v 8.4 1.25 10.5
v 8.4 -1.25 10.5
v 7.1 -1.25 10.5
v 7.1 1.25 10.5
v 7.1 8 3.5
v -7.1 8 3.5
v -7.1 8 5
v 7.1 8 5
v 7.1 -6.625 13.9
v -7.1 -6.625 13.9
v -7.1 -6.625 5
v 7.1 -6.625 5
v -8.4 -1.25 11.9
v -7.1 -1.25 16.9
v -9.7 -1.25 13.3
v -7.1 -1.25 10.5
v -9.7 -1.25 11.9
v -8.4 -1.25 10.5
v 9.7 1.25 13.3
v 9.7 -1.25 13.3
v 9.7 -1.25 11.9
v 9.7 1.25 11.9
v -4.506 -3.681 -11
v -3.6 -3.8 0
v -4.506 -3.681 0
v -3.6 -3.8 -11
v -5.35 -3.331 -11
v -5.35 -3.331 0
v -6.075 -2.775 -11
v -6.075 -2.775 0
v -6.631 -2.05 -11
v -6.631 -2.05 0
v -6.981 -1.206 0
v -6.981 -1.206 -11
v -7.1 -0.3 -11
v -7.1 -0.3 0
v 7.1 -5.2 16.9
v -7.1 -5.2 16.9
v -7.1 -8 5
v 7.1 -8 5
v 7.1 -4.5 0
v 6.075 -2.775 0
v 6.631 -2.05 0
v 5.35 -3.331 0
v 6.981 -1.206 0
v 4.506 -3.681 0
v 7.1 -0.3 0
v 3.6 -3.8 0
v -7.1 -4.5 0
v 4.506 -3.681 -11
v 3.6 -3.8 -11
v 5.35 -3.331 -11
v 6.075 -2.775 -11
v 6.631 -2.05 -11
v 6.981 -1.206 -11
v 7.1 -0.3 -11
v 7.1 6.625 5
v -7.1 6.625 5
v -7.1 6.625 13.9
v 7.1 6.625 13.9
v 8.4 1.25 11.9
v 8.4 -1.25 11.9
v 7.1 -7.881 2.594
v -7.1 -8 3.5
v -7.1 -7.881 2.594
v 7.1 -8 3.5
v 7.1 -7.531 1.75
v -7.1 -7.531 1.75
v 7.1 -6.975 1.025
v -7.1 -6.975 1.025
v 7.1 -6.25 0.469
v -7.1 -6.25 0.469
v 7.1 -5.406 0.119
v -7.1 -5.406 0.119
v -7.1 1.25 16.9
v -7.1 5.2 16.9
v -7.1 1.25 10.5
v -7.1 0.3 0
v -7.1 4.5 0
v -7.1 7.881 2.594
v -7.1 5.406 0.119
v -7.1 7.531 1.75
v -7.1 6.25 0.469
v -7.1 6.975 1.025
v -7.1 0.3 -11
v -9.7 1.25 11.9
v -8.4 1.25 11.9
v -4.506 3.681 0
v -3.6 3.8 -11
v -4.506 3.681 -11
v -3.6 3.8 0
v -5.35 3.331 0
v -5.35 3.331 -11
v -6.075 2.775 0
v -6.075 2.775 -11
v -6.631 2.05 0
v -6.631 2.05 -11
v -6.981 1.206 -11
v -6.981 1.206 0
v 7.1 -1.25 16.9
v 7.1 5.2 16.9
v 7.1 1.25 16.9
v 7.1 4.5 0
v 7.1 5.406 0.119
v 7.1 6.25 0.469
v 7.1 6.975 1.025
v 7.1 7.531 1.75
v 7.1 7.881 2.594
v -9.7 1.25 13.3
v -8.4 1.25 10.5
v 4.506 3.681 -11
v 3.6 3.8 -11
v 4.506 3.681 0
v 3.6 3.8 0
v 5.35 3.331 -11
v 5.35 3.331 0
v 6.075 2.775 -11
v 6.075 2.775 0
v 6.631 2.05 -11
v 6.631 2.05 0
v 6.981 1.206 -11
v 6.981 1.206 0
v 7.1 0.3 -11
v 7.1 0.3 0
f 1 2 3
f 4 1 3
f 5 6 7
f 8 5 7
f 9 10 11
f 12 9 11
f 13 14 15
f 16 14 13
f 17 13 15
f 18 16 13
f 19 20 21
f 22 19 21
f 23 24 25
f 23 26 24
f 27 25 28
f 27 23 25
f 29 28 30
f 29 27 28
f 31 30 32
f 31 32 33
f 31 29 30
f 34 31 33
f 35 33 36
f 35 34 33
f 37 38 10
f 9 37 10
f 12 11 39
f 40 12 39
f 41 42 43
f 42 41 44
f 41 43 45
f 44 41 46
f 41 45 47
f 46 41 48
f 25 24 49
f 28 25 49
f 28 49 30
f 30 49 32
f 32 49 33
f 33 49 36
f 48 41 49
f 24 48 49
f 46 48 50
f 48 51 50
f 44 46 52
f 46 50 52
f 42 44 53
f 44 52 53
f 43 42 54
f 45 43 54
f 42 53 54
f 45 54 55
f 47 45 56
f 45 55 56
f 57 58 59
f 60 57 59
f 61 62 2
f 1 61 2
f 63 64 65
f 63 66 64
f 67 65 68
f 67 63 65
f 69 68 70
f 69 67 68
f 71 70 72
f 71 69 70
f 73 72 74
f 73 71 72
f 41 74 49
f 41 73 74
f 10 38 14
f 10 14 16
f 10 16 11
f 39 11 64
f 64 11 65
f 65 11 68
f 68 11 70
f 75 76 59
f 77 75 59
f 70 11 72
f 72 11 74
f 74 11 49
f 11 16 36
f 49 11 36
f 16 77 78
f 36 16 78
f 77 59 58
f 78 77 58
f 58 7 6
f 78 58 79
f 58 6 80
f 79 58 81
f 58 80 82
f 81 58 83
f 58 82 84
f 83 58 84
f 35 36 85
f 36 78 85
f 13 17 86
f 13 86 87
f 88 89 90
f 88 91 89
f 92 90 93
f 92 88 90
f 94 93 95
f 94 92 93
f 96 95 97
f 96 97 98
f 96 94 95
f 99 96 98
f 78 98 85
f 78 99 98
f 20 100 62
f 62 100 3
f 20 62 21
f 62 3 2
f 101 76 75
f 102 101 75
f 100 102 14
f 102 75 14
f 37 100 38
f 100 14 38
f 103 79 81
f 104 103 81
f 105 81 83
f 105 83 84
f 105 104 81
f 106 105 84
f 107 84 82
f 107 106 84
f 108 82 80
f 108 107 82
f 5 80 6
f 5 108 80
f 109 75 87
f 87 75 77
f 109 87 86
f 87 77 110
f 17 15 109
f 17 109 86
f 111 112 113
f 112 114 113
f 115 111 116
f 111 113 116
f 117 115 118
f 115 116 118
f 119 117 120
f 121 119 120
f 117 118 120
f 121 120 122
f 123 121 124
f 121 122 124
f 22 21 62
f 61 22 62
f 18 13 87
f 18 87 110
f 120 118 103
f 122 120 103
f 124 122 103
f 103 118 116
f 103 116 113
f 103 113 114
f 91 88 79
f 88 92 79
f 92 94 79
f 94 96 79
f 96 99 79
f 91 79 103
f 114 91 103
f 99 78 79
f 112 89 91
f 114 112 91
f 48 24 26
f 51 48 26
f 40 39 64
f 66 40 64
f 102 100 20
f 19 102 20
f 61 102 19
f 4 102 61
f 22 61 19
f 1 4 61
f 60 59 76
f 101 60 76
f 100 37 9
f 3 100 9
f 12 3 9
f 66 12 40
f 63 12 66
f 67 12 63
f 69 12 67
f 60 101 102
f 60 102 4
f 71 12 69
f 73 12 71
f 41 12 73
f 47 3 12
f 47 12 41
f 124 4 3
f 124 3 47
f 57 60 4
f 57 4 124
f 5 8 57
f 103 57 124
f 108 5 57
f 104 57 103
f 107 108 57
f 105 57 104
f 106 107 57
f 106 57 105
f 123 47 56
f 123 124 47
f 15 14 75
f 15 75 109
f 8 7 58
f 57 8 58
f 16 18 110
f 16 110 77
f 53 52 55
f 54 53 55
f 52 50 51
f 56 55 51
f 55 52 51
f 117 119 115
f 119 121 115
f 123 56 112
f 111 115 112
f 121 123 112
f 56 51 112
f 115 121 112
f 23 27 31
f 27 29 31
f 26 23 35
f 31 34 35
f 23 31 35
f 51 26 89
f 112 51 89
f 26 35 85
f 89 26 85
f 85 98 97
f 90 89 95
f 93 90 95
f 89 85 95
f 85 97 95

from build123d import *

# Parameters (mm, degrees)
BOSS_EXTRUDE1_DEPTH      = 7.1
BOSS_EXTRUDE1_DEPTH_BACK = 7.1
FILLET1_R                = 3.5
BOSS_EXTRUDE2_DEPTH      = 1.25
BOSS_EXTRUDE2_DEPTH_BACK = 1.25


with BuildPart() as part:
    # Sketch1 → Boss-Extrude1 (new, two sides: drawn at the far end of the back side and taken through both)
    with BuildSketch(Plane(origin=(0, 0, 0), x_dir=(0, 0, -1), z_dir=(1, 0, 0)).offset(-BOSS_EXTRUDE1_DEPTH_BACK)):
        Polygon((11, -3.8), (11, 3.8), (0, 3.8), (0, 8), (-5, 8), (-5, 6.625), (-13.9, 6.625), (-16.9, 5.2), (-16.9, -5.2), (-13.9, -6.625), (-5, -6.625), (-5, -8), (0, -8), (0, -3.8), align=None)
    extrude(amount=BOSS_EXTRUDE1_DEPTH + BOSS_EXTRUDE1_DEPTH_BACK)

    # Fillet1
    fillet1_edges = [part.edges().sort_by_distance(p)[0] for p in [
        (0, -8, 0),
        (0, 8, 0),
        (7.1, 3.8, -5.5),
        (7.1, -3.8, -5.5),
        (-7.1, 3.8, -5.5),
        (-7.1, -3.8, -5.5),
    ]]
    fillet(fillet1_edges, radius=FILLET1_R)

    # Sketch2 → Boss-Extrude2 (add, two sides: drawn at the far end of the back side and taken through both)
    with BuildSketch(Plane(origin=(0, 0, 0), x_dir=(1, 0, 0), z_dir=(0, 1, 0)).offset(-BOSS_EXTRUDE2_DEPTH_BACK)):
        Polygon((-7.1, -16.9), (-9.7, -13.3), (-9.7, -11.9), (-8.4, -11.9), (-8.4, -10.5), (-7.1, -10.5), align=None)
        Polygon((7.1, -10.5), (7.1, -16.9), (9.7, -13.3), (9.7, -11.9), (8.4, -11.9), (8.4, -10.5), align=None)
    extrude(amount=BOSS_EXTRUDE2_DEPTH + BOSS_EXTRUDE2_DEPTH_BACK)


solid = part.part
